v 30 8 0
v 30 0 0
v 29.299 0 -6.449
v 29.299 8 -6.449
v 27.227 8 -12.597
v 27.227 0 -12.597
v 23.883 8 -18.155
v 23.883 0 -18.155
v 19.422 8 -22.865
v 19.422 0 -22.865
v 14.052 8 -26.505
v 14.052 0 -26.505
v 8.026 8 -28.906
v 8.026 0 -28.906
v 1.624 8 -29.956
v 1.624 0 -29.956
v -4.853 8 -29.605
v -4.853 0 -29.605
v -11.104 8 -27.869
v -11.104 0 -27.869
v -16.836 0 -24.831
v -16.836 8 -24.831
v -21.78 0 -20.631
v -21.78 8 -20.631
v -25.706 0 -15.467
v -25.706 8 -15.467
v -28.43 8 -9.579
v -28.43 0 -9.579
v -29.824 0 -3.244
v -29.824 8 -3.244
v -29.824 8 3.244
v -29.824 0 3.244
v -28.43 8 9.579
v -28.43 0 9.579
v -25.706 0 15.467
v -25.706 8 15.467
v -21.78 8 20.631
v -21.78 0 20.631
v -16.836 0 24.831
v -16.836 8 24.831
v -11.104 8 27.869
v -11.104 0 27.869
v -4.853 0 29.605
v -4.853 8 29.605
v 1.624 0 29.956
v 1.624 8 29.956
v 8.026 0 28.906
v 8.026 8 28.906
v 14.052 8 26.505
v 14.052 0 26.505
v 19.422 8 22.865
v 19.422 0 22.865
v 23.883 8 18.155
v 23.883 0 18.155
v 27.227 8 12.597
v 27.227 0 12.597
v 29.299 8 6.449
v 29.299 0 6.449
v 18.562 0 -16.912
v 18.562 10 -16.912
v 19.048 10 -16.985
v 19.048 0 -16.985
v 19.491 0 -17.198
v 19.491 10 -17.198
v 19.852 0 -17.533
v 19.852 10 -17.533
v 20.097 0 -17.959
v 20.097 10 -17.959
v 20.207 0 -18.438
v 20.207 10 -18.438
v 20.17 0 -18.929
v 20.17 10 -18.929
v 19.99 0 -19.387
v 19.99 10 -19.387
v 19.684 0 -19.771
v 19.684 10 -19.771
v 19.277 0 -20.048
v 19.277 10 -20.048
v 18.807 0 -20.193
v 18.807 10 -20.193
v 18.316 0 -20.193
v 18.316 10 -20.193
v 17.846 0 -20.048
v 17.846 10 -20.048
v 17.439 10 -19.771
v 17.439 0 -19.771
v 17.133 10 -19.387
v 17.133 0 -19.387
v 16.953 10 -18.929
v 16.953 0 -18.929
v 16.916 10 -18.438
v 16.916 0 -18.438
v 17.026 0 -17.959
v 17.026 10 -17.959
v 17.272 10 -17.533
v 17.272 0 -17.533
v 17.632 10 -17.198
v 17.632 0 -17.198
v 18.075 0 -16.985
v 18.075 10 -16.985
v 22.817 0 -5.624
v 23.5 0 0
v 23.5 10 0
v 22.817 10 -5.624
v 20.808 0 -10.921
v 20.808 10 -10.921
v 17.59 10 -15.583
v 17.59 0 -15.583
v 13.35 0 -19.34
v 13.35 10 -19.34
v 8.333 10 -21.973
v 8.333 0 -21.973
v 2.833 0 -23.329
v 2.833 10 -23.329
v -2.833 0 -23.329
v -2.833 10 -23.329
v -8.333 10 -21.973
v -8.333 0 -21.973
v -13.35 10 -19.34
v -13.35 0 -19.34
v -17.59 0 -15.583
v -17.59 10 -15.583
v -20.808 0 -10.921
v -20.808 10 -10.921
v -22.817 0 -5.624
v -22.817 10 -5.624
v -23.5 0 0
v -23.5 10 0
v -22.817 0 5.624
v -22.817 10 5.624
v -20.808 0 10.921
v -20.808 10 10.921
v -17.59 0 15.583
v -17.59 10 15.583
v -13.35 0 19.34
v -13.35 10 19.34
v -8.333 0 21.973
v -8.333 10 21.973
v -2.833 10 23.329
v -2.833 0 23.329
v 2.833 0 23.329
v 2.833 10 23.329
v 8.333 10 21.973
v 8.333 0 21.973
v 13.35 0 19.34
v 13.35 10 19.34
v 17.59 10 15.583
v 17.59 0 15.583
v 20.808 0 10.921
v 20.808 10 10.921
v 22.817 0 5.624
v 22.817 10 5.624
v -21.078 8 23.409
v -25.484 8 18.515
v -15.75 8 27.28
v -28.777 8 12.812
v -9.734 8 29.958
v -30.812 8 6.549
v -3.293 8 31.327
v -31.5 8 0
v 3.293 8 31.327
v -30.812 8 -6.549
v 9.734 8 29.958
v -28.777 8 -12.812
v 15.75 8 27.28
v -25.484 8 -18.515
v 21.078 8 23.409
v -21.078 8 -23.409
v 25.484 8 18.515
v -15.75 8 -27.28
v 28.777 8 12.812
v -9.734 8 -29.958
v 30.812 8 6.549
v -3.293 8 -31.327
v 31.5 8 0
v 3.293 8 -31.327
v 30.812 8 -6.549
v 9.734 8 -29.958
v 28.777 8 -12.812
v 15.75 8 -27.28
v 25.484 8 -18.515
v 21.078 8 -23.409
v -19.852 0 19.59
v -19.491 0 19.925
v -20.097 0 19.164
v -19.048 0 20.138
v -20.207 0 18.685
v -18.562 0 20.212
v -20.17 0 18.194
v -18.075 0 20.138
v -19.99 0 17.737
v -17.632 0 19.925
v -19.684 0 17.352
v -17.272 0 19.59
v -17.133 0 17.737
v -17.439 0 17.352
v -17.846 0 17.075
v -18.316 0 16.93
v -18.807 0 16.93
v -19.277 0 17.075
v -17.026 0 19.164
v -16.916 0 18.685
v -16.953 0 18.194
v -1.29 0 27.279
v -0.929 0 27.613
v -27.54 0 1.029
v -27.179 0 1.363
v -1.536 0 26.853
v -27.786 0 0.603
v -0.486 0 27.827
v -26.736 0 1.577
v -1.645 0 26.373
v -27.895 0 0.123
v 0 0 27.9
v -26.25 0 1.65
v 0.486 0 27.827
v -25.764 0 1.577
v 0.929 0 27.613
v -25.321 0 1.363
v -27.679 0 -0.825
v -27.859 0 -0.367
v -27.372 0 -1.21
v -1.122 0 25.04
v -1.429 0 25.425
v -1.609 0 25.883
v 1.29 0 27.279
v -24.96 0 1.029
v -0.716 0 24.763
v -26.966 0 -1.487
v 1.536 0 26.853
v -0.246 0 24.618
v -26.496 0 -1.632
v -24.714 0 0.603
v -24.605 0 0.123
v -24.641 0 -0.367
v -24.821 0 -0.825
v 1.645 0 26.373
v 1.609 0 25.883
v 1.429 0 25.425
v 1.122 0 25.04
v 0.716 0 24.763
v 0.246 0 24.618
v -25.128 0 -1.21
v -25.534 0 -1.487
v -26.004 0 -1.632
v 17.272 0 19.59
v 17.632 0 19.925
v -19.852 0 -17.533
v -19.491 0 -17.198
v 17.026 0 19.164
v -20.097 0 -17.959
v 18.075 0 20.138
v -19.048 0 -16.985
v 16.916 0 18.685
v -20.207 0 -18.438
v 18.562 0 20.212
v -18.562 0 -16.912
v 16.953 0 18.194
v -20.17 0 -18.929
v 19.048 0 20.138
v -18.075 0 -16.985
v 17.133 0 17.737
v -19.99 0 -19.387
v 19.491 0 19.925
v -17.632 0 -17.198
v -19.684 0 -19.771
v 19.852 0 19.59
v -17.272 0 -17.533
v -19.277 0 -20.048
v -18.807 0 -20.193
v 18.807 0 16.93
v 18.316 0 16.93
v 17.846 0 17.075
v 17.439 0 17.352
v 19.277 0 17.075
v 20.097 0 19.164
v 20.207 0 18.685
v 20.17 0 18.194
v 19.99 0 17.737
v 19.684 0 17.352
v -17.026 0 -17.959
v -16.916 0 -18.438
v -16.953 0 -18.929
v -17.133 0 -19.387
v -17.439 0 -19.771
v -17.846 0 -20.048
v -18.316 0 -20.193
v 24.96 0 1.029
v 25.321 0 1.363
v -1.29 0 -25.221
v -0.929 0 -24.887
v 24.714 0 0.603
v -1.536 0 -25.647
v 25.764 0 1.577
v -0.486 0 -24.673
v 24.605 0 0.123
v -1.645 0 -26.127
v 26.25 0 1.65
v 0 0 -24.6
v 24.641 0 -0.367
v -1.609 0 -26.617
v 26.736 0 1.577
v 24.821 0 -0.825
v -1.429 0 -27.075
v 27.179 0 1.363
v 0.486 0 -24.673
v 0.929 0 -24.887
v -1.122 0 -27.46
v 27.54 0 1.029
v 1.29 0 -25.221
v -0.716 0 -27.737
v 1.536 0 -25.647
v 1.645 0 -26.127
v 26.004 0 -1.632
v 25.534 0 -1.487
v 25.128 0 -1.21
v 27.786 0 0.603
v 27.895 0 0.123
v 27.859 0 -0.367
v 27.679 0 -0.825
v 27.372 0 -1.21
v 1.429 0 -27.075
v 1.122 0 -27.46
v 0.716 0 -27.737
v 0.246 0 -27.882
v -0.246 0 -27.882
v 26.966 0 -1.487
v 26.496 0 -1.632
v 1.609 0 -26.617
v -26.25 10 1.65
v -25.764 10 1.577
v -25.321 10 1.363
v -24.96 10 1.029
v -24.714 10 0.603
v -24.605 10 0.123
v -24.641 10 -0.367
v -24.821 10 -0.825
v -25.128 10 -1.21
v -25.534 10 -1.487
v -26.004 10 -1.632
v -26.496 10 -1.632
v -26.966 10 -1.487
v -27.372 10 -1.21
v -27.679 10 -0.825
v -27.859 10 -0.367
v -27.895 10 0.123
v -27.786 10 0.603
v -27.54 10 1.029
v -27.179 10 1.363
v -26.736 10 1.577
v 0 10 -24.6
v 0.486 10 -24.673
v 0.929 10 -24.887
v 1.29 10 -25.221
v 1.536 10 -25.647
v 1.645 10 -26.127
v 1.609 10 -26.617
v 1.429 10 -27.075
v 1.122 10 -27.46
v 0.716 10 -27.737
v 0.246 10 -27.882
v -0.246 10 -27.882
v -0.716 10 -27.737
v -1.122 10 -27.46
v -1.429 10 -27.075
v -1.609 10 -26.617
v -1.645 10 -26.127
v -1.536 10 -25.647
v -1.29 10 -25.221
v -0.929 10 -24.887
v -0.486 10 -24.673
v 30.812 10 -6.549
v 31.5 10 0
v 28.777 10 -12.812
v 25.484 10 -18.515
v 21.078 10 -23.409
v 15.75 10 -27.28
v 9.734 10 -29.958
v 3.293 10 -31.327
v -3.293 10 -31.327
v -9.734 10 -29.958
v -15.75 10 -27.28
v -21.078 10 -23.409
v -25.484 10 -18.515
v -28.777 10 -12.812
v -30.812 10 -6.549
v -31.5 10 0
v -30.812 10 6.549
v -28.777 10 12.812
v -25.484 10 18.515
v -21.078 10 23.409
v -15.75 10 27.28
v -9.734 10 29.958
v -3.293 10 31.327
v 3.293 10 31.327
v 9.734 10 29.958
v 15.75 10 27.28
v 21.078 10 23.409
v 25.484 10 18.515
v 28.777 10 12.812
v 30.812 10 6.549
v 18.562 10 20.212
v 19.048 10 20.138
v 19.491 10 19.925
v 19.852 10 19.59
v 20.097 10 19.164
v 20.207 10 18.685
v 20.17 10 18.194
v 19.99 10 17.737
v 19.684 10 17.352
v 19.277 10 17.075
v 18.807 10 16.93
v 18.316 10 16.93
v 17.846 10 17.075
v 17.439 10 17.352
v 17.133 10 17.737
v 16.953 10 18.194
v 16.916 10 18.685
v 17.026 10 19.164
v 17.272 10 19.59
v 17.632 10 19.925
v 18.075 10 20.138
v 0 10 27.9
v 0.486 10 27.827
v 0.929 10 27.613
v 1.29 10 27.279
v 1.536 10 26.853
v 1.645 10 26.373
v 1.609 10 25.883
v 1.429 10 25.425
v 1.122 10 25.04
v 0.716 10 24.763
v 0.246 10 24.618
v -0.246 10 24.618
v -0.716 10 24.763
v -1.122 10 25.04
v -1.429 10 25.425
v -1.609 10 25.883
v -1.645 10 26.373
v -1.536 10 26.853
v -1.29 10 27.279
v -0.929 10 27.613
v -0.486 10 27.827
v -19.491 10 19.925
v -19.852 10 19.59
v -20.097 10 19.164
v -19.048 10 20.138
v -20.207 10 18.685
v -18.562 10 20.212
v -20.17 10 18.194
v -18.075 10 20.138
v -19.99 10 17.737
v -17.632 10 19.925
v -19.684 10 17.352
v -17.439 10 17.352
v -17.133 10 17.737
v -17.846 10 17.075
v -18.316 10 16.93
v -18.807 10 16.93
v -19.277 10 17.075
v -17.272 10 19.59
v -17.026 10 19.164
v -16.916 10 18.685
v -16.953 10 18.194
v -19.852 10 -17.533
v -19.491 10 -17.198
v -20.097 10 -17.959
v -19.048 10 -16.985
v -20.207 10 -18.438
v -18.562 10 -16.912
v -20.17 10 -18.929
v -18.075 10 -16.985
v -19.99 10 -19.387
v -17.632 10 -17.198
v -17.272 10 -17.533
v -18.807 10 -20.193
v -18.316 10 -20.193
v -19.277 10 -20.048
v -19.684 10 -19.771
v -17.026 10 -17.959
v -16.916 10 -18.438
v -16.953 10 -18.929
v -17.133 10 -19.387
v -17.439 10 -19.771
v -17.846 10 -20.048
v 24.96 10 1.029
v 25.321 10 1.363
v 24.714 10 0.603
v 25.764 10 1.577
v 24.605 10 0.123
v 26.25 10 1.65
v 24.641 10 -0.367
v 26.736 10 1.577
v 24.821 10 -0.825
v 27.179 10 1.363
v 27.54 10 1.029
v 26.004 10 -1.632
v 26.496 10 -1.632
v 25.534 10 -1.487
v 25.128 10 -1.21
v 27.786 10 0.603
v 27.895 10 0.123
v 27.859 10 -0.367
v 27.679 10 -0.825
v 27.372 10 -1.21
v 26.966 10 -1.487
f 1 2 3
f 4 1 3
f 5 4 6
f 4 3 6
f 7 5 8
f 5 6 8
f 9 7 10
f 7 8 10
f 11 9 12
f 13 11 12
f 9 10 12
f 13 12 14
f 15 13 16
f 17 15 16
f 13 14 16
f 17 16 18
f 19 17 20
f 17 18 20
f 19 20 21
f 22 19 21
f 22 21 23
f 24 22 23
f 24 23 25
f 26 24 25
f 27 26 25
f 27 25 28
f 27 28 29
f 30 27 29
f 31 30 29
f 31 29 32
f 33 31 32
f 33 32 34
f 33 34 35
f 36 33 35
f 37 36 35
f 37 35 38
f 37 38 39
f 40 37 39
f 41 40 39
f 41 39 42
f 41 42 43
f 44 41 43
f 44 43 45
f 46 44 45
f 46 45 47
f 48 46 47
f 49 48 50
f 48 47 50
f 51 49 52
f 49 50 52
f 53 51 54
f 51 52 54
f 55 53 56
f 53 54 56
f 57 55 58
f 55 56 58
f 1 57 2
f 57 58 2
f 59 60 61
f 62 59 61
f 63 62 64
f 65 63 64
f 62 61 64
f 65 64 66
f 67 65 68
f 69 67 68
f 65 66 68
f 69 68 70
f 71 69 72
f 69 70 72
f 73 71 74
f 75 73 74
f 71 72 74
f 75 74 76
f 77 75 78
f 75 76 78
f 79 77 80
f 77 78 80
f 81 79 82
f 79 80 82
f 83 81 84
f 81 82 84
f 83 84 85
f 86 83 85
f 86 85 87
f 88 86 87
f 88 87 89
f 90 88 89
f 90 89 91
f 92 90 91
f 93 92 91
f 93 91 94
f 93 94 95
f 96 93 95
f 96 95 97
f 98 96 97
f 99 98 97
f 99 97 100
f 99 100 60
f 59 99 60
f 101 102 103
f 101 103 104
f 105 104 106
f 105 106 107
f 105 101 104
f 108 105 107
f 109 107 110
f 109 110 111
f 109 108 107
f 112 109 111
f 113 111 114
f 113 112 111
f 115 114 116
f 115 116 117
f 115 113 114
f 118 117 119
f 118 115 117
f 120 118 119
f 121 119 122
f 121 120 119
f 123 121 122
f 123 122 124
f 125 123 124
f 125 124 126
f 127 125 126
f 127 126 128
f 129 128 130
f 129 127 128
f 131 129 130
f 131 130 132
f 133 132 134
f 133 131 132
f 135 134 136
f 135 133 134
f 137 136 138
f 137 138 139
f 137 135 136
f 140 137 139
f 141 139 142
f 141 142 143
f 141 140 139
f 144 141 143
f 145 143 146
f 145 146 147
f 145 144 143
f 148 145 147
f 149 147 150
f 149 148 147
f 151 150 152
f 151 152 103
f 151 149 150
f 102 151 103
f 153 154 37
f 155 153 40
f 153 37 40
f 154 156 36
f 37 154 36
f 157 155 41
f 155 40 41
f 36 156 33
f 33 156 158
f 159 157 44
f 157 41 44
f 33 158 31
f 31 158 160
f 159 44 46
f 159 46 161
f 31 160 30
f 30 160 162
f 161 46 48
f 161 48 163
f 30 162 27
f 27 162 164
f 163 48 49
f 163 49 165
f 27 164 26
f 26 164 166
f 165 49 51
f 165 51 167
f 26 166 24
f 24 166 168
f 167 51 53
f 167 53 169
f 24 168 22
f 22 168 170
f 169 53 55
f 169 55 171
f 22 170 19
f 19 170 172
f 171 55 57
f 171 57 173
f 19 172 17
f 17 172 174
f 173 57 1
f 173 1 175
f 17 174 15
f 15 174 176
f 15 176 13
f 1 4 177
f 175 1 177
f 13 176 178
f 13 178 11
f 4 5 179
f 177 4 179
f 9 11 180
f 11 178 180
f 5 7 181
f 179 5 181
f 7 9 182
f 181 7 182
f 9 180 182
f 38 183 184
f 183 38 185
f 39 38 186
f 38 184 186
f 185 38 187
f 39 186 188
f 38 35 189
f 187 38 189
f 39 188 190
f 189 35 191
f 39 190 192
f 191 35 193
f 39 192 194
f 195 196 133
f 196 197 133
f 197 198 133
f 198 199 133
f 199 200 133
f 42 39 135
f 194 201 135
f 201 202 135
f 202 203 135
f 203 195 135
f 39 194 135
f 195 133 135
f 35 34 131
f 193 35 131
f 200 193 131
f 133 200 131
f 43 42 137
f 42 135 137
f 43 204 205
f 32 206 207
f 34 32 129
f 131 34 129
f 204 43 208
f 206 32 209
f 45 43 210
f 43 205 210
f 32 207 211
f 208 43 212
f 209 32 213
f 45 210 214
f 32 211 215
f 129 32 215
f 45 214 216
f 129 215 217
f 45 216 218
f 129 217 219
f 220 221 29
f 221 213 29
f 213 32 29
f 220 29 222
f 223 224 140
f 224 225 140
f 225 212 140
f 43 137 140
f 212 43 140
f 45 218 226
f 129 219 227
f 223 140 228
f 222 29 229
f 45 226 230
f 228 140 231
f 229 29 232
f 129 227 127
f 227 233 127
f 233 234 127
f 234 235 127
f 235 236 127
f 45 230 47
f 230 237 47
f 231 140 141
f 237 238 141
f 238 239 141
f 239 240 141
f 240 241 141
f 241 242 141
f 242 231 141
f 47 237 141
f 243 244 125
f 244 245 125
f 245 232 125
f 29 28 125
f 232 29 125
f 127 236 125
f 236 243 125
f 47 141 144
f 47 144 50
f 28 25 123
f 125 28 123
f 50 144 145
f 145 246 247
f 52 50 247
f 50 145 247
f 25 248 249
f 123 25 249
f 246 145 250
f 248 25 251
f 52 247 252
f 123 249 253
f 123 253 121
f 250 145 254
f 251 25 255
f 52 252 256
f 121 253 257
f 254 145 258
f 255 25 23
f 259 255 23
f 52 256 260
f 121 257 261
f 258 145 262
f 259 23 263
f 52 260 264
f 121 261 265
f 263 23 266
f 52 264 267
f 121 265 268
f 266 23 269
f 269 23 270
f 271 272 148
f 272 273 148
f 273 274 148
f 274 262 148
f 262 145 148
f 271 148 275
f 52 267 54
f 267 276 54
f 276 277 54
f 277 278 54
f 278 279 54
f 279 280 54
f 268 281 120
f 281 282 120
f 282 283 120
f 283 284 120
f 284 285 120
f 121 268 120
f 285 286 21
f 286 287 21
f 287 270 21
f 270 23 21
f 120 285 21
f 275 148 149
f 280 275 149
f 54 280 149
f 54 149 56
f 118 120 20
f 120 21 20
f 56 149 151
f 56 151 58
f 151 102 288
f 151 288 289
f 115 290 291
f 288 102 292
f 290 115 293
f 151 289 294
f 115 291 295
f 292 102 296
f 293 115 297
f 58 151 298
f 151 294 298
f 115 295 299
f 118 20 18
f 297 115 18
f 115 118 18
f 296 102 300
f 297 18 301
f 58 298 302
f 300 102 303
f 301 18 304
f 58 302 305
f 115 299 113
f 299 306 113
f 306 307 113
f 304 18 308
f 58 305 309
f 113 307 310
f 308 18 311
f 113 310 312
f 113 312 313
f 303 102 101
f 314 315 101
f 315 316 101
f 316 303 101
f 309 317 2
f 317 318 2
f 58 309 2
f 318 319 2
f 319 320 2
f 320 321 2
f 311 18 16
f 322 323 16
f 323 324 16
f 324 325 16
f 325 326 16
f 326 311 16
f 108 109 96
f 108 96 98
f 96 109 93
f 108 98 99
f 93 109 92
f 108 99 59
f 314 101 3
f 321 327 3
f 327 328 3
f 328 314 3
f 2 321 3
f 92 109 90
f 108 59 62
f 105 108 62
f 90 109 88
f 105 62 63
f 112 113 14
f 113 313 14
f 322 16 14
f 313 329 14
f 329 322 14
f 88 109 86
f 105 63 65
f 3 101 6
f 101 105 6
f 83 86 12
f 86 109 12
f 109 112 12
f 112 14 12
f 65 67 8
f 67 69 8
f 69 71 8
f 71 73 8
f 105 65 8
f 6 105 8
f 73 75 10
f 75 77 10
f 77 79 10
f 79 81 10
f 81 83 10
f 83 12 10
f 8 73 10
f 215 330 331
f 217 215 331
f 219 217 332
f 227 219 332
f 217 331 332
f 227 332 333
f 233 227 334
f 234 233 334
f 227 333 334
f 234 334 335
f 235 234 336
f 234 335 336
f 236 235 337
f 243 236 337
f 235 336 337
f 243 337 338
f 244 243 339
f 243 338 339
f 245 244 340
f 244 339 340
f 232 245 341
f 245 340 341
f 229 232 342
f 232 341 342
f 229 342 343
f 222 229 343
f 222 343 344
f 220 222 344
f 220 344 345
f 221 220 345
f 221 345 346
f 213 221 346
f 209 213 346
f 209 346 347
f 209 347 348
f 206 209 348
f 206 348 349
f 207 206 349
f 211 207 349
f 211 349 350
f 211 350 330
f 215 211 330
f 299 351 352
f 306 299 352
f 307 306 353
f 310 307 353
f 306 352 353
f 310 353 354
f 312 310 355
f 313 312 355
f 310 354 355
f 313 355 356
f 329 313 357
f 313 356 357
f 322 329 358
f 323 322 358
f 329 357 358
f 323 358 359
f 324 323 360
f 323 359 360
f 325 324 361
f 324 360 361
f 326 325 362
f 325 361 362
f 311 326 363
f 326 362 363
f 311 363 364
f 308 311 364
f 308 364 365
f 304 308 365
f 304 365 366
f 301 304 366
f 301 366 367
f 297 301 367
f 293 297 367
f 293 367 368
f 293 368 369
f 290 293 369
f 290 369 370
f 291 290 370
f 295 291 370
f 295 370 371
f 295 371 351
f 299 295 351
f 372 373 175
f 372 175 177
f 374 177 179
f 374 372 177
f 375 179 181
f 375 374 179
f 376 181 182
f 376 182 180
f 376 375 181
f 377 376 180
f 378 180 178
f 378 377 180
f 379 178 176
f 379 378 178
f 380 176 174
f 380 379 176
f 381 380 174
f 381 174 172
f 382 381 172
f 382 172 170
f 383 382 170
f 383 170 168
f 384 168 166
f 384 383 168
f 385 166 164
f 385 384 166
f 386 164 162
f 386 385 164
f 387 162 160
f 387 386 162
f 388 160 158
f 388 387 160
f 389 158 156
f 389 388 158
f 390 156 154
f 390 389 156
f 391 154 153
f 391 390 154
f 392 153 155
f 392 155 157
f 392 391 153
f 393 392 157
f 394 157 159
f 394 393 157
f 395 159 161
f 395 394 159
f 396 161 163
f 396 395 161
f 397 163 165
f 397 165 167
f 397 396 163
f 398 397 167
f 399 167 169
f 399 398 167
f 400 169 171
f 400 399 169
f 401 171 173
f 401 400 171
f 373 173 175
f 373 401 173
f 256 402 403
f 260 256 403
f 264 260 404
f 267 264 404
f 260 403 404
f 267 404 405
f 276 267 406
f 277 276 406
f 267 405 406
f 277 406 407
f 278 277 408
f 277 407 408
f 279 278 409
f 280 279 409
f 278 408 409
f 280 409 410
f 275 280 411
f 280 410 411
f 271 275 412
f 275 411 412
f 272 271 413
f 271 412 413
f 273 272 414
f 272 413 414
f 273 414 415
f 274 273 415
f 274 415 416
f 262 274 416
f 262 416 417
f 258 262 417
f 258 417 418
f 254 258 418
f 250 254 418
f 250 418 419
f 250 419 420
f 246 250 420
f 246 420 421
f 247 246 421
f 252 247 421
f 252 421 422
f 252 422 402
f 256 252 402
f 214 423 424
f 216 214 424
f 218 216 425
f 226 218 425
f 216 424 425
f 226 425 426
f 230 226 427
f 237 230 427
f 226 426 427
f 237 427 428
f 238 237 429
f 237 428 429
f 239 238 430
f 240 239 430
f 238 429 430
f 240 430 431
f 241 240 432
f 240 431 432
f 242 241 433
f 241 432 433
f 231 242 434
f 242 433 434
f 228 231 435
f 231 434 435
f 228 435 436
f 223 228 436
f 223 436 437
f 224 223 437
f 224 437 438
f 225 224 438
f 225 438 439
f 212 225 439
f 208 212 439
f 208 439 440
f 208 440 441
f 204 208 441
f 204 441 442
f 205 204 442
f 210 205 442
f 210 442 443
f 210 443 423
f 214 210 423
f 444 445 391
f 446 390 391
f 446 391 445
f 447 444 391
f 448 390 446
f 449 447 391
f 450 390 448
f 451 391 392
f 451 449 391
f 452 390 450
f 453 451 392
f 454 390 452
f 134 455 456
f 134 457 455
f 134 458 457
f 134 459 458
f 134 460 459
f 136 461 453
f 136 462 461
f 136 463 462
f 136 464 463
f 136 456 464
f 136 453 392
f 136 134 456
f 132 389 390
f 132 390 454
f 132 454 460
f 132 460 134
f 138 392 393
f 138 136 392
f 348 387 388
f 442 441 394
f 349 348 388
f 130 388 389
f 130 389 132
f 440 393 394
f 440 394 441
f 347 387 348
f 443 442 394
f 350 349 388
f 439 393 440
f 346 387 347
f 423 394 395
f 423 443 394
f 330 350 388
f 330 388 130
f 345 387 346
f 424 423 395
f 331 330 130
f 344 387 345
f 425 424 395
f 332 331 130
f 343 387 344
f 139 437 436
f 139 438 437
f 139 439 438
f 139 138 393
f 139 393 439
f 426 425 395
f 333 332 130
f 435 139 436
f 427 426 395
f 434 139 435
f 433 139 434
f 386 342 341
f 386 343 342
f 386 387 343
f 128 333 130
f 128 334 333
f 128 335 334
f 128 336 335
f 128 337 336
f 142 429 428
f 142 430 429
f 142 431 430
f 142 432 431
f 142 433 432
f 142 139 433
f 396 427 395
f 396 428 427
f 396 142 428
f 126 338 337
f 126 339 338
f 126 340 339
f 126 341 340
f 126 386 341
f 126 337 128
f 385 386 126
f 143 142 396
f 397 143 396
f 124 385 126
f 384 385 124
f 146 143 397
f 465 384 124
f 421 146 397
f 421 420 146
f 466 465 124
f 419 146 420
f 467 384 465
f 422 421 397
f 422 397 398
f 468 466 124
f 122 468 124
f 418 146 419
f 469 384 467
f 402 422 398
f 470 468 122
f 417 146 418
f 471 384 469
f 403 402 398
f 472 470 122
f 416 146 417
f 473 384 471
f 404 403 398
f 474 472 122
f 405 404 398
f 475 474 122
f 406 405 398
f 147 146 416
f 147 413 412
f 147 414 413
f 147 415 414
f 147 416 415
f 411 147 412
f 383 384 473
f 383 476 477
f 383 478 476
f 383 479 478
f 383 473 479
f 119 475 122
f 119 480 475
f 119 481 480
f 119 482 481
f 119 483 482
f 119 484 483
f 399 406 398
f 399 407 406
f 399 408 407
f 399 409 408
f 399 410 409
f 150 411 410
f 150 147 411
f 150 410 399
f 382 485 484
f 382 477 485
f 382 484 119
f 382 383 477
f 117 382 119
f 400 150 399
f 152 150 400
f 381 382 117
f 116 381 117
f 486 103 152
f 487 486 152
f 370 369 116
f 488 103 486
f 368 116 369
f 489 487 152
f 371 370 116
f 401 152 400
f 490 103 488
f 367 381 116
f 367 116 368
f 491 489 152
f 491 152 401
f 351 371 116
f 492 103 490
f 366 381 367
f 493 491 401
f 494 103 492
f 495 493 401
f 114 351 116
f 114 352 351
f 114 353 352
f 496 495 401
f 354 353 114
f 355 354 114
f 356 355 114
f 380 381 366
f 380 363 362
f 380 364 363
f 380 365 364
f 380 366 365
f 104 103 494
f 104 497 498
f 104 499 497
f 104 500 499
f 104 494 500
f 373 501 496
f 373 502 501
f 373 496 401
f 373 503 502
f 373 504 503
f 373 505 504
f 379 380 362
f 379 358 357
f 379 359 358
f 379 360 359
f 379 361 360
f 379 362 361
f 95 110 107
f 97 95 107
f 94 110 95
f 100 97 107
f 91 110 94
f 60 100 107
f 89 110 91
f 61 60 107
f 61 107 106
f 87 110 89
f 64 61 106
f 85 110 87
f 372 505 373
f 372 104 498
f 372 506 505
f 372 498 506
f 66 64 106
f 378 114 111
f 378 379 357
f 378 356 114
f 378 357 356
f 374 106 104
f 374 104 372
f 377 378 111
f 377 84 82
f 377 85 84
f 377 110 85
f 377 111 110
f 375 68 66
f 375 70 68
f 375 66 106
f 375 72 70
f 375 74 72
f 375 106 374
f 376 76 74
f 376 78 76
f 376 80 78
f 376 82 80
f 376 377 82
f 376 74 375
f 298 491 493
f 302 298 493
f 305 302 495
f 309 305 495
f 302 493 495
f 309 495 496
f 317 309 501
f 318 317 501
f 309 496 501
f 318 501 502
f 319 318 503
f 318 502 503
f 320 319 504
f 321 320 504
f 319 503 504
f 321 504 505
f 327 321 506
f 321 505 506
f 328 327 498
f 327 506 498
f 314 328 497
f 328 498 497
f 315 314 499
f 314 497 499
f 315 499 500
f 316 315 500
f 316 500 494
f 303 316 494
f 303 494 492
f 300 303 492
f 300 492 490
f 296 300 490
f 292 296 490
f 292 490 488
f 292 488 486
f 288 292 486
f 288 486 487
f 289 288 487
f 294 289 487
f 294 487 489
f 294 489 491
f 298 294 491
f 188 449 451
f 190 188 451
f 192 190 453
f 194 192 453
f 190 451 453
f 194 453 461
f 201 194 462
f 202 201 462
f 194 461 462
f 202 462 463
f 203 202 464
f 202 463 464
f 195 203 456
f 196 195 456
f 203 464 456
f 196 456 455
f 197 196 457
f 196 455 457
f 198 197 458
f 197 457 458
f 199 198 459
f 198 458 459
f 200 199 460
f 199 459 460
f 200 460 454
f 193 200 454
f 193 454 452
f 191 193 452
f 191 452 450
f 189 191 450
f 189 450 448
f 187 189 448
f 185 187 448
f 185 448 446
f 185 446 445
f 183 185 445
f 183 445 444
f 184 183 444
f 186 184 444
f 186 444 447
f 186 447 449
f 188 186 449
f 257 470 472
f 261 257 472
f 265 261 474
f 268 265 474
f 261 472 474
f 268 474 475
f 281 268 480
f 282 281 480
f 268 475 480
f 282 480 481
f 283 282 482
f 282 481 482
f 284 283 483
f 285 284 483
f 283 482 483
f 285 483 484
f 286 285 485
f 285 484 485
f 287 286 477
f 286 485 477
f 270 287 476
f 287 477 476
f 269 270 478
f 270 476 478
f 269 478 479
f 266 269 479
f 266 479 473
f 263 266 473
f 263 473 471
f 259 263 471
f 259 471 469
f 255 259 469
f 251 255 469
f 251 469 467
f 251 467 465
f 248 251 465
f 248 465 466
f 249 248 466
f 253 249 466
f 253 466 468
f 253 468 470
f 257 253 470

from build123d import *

# Parameters (mm, degrees)
SKETCH_1_R         = 30
SKETCH_1_R_2       = 23.5
EXTRUDE_1_DEPTH    = 10
SKETCH_2_R         = 31.5
SKETCH_2_R_2       = 30
EXTRUDE_2_DEPTH    = 2
HOLE_WIZARD_M4_1_D = 3.3


with BuildPart() as part:
    # 草图1 → 凸台-拉伸1 (new body)
    with BuildSketch(Plane(origin=(0, 0, 0), x_dir=(1, 0, 0), z_dir=(0, 1, 0))):
        Circle(SKETCH_1_R)
        Circle(SKETCH_1_R_2, mode=Mode.SUBTRACT)
    extrude(amount=EXTRUDE_1_DEPTH)

    # 草图2 → 凸台-拉伸2 (add)
    with BuildSketch(Plane(origin=(0, 10, 0), x_dir=(1, 0, 0), z_dir=(0, 1, 0))):
        Circle(SKETCH_2_R)
        Circle(SKETCH_2_R_2, mode=Mode.SUBTRACT)
    extrude(amount=-EXTRUDE_2_DEPTH)

    # M4 螺纹孔1 (through all)
    with Locations(Plane(origin=(-18.561553006, 0, 18.561553006), x_dir=(0, 0, -1), z_dir=(0, -1, 0))):
        with Locations((0, 0), (-7.688446994, 18.561553006), (18.561553006, -7.688446994), (37.123106012, 0), (44.811553006, 18.561553006), (37.123106012, 37.123106012), (18.561553006, 44.811553006), (0, 37.123106012)):
            Hole(HOLE_WIZARD_M4_1_D / 2)


solid = part.part
